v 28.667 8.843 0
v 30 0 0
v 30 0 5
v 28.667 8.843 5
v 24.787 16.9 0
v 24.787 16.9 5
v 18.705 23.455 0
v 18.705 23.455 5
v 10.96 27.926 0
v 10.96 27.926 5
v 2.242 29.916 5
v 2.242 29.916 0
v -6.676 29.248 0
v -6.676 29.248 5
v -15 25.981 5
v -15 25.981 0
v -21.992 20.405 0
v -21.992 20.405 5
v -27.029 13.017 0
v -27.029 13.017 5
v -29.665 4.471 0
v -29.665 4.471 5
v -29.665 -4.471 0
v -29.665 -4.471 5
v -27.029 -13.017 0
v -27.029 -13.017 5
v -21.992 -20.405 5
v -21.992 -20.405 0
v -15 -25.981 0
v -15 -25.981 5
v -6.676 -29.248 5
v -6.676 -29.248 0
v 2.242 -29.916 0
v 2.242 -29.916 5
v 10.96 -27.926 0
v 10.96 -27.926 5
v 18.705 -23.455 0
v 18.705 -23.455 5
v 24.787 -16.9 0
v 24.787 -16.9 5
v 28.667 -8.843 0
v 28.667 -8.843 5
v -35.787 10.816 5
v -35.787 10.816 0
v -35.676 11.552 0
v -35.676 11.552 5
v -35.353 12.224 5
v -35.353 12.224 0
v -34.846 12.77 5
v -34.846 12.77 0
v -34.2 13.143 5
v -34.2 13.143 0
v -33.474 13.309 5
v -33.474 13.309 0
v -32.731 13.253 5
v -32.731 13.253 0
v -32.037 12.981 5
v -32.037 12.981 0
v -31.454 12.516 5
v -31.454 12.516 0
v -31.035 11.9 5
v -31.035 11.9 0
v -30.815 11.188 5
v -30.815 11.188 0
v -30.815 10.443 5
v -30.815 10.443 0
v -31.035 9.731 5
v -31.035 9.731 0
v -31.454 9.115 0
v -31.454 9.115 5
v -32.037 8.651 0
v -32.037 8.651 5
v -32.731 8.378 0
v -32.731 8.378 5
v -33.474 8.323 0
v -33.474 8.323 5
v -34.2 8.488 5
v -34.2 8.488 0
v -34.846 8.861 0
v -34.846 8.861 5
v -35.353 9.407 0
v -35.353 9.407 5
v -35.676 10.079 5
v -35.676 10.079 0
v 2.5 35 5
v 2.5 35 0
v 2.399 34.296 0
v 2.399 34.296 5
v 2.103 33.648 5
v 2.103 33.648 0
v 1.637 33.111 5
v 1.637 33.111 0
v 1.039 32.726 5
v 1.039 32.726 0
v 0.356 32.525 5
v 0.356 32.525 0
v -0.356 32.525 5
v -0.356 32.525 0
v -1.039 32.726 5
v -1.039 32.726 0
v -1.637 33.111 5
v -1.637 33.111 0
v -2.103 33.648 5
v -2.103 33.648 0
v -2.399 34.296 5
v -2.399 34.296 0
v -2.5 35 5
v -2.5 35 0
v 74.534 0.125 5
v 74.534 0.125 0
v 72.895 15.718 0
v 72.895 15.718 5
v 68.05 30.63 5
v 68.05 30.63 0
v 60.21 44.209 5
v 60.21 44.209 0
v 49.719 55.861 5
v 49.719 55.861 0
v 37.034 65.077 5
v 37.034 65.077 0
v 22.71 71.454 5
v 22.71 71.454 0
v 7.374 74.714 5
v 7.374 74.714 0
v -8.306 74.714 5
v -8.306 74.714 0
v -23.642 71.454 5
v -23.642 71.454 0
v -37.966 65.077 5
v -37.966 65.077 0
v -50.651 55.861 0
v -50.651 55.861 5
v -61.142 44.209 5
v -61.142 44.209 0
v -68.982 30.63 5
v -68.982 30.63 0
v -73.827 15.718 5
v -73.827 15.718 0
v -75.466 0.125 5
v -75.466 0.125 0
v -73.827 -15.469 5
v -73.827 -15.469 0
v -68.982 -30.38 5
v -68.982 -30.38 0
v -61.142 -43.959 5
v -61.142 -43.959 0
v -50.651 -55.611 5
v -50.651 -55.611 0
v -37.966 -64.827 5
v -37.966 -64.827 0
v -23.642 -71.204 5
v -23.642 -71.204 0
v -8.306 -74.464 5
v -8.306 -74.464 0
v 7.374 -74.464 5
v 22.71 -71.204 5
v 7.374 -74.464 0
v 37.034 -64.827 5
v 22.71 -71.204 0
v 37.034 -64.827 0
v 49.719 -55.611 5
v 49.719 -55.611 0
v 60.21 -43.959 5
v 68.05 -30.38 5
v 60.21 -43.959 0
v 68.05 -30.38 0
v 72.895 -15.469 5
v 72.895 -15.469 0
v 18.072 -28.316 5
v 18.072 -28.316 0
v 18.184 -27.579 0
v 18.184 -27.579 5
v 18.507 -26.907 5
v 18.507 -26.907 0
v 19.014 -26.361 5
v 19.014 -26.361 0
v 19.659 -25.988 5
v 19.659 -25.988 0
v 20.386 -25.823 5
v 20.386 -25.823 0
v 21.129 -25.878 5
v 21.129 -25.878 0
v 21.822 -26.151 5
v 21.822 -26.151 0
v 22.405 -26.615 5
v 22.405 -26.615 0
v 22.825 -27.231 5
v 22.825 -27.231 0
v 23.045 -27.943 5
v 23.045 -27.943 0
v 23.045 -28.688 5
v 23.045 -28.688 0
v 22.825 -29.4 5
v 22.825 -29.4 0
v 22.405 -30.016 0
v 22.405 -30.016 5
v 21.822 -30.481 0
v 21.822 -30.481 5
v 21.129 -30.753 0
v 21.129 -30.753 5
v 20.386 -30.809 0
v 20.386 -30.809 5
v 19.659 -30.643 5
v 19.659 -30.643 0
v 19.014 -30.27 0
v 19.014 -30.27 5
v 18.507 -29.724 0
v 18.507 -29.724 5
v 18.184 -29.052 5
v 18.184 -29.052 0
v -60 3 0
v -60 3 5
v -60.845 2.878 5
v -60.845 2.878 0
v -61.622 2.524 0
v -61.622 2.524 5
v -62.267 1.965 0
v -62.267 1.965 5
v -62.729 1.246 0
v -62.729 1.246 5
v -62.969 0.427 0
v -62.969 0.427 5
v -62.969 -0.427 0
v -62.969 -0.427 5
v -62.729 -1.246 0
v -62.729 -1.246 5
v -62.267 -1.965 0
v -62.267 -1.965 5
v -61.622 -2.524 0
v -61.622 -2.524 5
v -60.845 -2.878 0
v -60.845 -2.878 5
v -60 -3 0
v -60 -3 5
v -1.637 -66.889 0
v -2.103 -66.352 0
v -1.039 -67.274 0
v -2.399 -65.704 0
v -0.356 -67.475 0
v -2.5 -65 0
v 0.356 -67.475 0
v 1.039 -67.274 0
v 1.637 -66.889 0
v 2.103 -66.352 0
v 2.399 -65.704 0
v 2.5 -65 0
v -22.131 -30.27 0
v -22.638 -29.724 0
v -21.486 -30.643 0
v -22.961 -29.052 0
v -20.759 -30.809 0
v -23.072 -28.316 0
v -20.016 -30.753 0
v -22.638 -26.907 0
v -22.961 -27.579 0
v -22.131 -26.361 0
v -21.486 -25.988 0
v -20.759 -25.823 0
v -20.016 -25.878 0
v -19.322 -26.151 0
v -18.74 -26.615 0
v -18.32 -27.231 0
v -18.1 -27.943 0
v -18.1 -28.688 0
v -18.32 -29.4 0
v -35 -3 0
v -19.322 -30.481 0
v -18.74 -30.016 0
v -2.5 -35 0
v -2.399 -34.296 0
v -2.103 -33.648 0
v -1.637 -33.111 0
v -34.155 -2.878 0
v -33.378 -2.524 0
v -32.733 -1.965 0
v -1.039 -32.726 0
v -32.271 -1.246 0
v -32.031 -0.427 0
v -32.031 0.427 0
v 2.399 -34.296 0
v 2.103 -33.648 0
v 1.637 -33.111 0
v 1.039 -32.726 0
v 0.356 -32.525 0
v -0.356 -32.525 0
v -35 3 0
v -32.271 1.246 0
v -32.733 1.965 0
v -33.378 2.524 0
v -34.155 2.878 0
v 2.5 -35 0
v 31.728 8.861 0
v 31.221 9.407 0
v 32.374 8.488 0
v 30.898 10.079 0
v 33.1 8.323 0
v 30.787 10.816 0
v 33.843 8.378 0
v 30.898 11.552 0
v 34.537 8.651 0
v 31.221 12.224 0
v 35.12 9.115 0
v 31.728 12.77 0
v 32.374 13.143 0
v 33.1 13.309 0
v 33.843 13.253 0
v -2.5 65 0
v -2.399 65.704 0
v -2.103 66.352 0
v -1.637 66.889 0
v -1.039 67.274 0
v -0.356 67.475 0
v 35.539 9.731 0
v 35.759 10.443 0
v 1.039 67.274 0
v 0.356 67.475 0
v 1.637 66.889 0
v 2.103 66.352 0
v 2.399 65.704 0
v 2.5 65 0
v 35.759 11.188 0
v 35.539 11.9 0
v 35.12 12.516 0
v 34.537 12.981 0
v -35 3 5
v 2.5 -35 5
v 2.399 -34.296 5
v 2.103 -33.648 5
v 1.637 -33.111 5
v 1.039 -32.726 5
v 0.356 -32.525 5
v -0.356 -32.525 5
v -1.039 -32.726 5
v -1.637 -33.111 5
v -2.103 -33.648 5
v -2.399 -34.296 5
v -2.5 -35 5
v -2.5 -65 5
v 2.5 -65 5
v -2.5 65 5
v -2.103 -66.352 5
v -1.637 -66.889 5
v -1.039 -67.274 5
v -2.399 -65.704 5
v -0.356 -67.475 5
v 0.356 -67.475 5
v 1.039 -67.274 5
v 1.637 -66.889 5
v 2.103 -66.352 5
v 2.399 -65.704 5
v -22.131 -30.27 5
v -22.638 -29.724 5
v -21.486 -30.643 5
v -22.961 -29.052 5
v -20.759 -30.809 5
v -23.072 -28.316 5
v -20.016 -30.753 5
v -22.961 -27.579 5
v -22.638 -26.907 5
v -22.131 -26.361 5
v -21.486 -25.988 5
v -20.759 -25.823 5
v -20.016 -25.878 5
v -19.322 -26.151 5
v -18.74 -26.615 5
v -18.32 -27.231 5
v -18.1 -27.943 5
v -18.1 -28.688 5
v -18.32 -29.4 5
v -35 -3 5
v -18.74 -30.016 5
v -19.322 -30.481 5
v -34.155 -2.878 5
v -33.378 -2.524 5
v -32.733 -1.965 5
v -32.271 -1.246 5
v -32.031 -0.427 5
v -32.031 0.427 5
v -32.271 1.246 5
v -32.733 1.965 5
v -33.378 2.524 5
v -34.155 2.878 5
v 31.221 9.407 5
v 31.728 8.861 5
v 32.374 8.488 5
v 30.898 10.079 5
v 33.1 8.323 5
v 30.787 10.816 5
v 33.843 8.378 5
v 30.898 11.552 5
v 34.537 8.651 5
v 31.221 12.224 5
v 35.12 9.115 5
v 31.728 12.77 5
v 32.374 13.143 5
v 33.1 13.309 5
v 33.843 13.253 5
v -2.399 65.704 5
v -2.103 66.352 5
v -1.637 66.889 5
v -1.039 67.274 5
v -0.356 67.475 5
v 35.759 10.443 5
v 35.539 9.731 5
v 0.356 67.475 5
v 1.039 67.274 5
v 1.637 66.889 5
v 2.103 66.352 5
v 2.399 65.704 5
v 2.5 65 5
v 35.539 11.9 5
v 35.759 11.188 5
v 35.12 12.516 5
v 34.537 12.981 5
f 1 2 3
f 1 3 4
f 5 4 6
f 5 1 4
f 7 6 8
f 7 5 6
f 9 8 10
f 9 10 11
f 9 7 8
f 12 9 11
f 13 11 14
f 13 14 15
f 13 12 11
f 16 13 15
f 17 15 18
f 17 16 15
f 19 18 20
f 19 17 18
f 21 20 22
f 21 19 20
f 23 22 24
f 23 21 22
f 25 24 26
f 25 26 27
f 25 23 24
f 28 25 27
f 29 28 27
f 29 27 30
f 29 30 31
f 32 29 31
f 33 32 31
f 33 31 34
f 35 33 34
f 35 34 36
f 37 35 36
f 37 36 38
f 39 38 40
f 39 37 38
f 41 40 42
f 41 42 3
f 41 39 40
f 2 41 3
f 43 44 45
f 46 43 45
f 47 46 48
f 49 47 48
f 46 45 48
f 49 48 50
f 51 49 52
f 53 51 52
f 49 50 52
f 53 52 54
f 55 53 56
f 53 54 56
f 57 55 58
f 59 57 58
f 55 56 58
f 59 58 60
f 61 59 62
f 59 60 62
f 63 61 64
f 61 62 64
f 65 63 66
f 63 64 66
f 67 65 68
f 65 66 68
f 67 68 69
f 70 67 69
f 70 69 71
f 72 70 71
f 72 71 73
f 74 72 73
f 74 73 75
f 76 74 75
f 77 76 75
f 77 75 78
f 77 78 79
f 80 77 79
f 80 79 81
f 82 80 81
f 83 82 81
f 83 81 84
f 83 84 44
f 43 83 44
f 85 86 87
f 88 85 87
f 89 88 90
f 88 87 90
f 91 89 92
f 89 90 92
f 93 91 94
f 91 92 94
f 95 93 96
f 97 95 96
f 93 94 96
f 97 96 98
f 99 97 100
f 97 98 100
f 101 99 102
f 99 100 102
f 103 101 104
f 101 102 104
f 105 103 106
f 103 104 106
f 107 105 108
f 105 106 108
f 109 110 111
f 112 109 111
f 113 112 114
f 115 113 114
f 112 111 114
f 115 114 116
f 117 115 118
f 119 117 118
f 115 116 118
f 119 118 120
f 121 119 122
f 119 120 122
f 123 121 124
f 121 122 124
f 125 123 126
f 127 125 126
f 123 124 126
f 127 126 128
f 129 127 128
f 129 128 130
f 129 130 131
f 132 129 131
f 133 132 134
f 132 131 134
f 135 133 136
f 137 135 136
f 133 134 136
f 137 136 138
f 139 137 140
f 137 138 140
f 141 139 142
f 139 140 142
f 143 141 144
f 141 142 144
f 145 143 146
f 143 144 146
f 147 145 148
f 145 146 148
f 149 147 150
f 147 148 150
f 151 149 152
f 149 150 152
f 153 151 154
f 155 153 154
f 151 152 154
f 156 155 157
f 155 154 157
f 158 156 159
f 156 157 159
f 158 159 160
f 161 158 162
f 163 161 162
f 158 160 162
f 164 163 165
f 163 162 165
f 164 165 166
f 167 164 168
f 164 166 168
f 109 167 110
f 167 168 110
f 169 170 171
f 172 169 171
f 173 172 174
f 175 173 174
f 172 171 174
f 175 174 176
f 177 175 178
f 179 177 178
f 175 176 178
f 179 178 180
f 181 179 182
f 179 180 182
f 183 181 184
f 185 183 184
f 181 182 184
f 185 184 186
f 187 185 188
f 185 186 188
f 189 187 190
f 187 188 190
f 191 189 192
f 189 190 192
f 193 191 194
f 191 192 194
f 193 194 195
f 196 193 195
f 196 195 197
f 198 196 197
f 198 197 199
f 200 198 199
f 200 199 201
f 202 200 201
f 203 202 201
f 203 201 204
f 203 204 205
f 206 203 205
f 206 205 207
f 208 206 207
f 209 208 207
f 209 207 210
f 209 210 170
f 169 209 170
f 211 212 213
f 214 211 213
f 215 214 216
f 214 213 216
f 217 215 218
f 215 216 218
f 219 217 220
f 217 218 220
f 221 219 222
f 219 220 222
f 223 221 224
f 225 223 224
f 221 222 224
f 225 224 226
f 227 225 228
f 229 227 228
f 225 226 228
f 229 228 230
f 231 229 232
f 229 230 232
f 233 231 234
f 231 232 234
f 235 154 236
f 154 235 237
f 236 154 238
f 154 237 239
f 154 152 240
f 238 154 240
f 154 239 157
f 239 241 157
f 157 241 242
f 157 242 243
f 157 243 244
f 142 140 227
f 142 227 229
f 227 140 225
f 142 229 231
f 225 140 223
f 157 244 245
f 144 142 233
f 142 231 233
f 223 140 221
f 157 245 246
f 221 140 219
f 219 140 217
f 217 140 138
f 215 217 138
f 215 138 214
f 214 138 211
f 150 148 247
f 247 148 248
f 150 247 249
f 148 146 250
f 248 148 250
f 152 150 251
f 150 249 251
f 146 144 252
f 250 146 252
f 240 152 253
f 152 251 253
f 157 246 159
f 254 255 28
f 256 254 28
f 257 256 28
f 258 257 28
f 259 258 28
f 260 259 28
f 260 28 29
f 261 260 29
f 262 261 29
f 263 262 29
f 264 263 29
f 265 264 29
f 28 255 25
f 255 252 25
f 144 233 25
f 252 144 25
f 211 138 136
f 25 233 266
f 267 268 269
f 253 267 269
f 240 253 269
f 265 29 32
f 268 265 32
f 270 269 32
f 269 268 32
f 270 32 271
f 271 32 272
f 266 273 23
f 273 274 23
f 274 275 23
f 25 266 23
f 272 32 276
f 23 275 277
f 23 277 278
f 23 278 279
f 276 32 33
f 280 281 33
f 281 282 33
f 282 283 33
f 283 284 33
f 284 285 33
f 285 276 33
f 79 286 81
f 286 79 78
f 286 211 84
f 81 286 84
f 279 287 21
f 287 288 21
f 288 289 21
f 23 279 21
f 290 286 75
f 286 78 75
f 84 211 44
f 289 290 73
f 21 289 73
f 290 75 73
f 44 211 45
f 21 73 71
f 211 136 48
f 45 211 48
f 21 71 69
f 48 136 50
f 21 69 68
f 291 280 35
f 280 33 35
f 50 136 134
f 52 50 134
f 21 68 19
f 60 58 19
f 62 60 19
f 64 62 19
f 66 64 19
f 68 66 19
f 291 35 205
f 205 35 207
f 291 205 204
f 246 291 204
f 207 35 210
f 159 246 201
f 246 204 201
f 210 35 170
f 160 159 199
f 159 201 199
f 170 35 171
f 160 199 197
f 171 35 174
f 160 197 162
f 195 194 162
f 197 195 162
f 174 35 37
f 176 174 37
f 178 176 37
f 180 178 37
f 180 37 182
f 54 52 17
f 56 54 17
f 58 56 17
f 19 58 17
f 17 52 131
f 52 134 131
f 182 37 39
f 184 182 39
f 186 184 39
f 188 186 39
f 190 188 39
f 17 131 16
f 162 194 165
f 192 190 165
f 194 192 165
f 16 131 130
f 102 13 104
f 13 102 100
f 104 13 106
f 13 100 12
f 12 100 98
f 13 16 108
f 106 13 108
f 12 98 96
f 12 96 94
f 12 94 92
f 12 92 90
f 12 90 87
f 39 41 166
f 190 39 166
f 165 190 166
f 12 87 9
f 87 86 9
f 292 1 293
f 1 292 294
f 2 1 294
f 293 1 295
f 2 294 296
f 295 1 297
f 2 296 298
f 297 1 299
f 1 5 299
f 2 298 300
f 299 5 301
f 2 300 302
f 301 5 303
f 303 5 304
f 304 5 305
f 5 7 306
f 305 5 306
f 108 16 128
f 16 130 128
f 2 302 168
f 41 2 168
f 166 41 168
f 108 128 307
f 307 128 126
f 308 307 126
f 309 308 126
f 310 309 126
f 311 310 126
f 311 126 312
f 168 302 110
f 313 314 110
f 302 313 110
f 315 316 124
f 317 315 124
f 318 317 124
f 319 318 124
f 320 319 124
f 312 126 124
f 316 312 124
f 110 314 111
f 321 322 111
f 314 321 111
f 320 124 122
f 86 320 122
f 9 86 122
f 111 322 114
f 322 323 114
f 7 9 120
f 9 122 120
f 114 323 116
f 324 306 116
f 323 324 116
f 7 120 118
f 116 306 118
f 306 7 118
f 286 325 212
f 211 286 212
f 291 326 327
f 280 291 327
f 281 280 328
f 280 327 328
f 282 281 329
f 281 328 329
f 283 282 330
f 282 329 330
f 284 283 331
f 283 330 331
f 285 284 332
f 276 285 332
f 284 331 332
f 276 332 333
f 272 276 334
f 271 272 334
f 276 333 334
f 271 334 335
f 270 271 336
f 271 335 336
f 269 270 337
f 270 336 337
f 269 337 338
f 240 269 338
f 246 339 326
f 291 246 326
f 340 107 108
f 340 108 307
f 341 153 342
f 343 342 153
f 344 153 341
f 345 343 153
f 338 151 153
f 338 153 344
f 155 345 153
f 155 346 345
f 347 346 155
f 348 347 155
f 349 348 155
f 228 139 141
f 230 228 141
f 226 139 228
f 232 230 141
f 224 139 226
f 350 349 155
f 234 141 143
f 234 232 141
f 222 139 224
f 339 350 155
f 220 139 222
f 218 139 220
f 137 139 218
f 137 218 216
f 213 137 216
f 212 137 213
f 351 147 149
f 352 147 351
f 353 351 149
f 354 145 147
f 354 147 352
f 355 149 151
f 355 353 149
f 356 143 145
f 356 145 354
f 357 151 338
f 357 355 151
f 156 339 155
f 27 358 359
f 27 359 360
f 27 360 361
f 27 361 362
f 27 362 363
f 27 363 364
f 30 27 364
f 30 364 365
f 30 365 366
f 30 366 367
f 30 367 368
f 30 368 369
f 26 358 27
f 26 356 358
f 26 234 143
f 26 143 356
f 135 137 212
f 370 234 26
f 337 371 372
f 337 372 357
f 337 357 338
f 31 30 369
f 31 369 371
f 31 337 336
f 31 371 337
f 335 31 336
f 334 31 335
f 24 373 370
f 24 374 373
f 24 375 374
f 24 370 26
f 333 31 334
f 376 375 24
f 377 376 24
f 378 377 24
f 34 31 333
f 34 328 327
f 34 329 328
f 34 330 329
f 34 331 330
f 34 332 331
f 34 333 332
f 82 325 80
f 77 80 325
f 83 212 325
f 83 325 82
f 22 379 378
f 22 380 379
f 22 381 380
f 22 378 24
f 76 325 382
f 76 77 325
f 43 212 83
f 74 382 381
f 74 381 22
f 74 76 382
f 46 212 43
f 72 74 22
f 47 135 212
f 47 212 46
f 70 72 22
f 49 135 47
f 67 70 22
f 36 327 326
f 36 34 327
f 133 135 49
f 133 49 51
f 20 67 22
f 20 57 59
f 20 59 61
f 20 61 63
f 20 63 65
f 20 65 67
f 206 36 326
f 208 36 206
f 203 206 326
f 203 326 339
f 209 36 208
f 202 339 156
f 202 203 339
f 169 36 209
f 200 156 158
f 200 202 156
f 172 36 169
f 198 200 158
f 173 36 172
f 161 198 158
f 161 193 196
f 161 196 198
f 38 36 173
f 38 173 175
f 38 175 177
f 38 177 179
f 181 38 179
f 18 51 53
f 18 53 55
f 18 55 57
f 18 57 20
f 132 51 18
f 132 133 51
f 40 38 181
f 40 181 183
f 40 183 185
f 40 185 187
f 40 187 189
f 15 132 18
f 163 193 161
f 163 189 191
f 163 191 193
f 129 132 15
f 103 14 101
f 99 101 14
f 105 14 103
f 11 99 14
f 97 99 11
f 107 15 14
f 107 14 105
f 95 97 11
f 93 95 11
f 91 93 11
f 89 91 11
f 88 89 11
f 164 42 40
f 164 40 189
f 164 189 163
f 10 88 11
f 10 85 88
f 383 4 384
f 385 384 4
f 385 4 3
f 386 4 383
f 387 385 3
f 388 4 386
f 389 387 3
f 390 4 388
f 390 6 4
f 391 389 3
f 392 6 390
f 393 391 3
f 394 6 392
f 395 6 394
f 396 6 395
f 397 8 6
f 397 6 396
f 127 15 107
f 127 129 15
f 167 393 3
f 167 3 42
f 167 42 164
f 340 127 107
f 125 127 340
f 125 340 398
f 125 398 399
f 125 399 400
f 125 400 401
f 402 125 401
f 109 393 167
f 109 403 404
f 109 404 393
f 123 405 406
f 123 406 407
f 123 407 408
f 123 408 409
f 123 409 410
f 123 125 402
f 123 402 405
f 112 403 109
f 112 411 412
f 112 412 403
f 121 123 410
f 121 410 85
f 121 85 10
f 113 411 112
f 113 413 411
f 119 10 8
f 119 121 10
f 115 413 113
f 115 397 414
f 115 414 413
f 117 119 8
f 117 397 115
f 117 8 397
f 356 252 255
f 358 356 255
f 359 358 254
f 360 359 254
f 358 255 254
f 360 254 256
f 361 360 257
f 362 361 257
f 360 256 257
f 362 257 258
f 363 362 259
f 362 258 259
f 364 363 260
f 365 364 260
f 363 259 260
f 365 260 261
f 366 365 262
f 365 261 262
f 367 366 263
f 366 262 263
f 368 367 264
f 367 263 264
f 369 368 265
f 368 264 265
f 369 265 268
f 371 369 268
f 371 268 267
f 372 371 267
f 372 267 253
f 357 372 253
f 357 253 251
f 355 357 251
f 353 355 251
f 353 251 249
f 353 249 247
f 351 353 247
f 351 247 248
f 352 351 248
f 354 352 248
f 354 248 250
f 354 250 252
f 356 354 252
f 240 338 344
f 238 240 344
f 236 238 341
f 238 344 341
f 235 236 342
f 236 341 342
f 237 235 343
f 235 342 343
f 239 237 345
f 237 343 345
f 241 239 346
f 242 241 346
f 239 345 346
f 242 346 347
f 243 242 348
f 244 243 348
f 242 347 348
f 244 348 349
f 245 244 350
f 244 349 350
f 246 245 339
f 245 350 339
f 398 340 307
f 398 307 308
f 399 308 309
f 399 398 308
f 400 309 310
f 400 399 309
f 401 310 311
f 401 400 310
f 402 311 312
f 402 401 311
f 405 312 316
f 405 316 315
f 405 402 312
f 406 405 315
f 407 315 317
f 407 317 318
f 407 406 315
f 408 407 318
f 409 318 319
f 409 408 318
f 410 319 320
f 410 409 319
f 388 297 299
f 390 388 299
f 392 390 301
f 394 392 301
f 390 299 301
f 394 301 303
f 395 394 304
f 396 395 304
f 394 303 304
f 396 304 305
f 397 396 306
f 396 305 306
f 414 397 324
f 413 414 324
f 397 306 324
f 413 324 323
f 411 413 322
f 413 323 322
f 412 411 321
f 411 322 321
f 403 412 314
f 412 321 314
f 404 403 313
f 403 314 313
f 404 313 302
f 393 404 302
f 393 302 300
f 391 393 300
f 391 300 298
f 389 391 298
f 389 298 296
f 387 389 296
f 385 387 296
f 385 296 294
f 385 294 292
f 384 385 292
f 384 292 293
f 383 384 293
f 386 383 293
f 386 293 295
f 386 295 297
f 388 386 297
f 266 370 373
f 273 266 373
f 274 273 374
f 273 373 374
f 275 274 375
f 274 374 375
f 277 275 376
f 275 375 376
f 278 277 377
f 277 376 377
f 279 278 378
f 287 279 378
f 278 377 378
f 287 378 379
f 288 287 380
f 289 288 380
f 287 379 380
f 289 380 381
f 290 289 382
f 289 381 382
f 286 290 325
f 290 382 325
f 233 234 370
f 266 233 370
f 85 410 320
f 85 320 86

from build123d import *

# Parameters (mm, degrees)
F0_R     = 75
F0_R_2   = 30
F1_DEPTH = 5
F3_D     = 5
F5_DEPTH = 5
F7_DEPTH = 5


# Not quite as in the source:
# - a pattern or mirror of a feature is missing from the dataset's text; its kind, count and spacing are read off the source's solid


with BuildPart() as f1:
    # F0 (on Top) → F1 (new body)
    with BuildSketch(Plane.XY):
        with Locations((-0.4658745937, 0.1248266798)):
            Circle(F0_R)
        Circle(F0_R_2, mode=Mode.SUBTRACT)
    extrude(amount=F1_DEPTH)

    # F3 (through all)
    with Locations(Plane.XY.offset(5)):
        with Locations((0, 35), (33.2869780703, 10.8155948031), (20.5724838302, -28.3155948031), (-20.5724838302, -28.3155948031), (-33.2869780703, 10.8155948031)):
            Hole(F3_D / 2)

    # F4 (on face) → F5 (cut, through all)
    with BuildSketch(Plane.XY.offset(5)):
        with BuildLine():
            ThreePointArc((2.5, -35), (0, -32.5), (-2.5, -35))
            Line((-2.5, -35), (-2.5, -65))
            ThreePointArc((-2.5, -65), (0, -67.5), (2.5, -65))
            Line((2.5, -65), (2.5, -35))
        make_face()
    f5 = extrude(amount=-F5_DEPTH, mode=Mode.SUBTRACT)

    # F5_copies: F5 across plane
    add(f5.mirror(Plane.ZX), mode=Mode.SUBTRACT)

    # F6 (on face) → F7 (cut, through all)
    with BuildSketch(Plane.XY.offset(5)):
        with BuildLine():
            ThreePointArc((-60, 3), (-63, 0), (-60, -3))
            Line((-60, -3), (-35, -3))
            ThreePointArc((-35, -3), (-32, 0), (-35, 3))
            Line((-35, 3), (-60, 3))
        make_face()
    extrude(amount=-F7_DEPTH, mode=Mode.SUBTRACT)


solid = f1.part
